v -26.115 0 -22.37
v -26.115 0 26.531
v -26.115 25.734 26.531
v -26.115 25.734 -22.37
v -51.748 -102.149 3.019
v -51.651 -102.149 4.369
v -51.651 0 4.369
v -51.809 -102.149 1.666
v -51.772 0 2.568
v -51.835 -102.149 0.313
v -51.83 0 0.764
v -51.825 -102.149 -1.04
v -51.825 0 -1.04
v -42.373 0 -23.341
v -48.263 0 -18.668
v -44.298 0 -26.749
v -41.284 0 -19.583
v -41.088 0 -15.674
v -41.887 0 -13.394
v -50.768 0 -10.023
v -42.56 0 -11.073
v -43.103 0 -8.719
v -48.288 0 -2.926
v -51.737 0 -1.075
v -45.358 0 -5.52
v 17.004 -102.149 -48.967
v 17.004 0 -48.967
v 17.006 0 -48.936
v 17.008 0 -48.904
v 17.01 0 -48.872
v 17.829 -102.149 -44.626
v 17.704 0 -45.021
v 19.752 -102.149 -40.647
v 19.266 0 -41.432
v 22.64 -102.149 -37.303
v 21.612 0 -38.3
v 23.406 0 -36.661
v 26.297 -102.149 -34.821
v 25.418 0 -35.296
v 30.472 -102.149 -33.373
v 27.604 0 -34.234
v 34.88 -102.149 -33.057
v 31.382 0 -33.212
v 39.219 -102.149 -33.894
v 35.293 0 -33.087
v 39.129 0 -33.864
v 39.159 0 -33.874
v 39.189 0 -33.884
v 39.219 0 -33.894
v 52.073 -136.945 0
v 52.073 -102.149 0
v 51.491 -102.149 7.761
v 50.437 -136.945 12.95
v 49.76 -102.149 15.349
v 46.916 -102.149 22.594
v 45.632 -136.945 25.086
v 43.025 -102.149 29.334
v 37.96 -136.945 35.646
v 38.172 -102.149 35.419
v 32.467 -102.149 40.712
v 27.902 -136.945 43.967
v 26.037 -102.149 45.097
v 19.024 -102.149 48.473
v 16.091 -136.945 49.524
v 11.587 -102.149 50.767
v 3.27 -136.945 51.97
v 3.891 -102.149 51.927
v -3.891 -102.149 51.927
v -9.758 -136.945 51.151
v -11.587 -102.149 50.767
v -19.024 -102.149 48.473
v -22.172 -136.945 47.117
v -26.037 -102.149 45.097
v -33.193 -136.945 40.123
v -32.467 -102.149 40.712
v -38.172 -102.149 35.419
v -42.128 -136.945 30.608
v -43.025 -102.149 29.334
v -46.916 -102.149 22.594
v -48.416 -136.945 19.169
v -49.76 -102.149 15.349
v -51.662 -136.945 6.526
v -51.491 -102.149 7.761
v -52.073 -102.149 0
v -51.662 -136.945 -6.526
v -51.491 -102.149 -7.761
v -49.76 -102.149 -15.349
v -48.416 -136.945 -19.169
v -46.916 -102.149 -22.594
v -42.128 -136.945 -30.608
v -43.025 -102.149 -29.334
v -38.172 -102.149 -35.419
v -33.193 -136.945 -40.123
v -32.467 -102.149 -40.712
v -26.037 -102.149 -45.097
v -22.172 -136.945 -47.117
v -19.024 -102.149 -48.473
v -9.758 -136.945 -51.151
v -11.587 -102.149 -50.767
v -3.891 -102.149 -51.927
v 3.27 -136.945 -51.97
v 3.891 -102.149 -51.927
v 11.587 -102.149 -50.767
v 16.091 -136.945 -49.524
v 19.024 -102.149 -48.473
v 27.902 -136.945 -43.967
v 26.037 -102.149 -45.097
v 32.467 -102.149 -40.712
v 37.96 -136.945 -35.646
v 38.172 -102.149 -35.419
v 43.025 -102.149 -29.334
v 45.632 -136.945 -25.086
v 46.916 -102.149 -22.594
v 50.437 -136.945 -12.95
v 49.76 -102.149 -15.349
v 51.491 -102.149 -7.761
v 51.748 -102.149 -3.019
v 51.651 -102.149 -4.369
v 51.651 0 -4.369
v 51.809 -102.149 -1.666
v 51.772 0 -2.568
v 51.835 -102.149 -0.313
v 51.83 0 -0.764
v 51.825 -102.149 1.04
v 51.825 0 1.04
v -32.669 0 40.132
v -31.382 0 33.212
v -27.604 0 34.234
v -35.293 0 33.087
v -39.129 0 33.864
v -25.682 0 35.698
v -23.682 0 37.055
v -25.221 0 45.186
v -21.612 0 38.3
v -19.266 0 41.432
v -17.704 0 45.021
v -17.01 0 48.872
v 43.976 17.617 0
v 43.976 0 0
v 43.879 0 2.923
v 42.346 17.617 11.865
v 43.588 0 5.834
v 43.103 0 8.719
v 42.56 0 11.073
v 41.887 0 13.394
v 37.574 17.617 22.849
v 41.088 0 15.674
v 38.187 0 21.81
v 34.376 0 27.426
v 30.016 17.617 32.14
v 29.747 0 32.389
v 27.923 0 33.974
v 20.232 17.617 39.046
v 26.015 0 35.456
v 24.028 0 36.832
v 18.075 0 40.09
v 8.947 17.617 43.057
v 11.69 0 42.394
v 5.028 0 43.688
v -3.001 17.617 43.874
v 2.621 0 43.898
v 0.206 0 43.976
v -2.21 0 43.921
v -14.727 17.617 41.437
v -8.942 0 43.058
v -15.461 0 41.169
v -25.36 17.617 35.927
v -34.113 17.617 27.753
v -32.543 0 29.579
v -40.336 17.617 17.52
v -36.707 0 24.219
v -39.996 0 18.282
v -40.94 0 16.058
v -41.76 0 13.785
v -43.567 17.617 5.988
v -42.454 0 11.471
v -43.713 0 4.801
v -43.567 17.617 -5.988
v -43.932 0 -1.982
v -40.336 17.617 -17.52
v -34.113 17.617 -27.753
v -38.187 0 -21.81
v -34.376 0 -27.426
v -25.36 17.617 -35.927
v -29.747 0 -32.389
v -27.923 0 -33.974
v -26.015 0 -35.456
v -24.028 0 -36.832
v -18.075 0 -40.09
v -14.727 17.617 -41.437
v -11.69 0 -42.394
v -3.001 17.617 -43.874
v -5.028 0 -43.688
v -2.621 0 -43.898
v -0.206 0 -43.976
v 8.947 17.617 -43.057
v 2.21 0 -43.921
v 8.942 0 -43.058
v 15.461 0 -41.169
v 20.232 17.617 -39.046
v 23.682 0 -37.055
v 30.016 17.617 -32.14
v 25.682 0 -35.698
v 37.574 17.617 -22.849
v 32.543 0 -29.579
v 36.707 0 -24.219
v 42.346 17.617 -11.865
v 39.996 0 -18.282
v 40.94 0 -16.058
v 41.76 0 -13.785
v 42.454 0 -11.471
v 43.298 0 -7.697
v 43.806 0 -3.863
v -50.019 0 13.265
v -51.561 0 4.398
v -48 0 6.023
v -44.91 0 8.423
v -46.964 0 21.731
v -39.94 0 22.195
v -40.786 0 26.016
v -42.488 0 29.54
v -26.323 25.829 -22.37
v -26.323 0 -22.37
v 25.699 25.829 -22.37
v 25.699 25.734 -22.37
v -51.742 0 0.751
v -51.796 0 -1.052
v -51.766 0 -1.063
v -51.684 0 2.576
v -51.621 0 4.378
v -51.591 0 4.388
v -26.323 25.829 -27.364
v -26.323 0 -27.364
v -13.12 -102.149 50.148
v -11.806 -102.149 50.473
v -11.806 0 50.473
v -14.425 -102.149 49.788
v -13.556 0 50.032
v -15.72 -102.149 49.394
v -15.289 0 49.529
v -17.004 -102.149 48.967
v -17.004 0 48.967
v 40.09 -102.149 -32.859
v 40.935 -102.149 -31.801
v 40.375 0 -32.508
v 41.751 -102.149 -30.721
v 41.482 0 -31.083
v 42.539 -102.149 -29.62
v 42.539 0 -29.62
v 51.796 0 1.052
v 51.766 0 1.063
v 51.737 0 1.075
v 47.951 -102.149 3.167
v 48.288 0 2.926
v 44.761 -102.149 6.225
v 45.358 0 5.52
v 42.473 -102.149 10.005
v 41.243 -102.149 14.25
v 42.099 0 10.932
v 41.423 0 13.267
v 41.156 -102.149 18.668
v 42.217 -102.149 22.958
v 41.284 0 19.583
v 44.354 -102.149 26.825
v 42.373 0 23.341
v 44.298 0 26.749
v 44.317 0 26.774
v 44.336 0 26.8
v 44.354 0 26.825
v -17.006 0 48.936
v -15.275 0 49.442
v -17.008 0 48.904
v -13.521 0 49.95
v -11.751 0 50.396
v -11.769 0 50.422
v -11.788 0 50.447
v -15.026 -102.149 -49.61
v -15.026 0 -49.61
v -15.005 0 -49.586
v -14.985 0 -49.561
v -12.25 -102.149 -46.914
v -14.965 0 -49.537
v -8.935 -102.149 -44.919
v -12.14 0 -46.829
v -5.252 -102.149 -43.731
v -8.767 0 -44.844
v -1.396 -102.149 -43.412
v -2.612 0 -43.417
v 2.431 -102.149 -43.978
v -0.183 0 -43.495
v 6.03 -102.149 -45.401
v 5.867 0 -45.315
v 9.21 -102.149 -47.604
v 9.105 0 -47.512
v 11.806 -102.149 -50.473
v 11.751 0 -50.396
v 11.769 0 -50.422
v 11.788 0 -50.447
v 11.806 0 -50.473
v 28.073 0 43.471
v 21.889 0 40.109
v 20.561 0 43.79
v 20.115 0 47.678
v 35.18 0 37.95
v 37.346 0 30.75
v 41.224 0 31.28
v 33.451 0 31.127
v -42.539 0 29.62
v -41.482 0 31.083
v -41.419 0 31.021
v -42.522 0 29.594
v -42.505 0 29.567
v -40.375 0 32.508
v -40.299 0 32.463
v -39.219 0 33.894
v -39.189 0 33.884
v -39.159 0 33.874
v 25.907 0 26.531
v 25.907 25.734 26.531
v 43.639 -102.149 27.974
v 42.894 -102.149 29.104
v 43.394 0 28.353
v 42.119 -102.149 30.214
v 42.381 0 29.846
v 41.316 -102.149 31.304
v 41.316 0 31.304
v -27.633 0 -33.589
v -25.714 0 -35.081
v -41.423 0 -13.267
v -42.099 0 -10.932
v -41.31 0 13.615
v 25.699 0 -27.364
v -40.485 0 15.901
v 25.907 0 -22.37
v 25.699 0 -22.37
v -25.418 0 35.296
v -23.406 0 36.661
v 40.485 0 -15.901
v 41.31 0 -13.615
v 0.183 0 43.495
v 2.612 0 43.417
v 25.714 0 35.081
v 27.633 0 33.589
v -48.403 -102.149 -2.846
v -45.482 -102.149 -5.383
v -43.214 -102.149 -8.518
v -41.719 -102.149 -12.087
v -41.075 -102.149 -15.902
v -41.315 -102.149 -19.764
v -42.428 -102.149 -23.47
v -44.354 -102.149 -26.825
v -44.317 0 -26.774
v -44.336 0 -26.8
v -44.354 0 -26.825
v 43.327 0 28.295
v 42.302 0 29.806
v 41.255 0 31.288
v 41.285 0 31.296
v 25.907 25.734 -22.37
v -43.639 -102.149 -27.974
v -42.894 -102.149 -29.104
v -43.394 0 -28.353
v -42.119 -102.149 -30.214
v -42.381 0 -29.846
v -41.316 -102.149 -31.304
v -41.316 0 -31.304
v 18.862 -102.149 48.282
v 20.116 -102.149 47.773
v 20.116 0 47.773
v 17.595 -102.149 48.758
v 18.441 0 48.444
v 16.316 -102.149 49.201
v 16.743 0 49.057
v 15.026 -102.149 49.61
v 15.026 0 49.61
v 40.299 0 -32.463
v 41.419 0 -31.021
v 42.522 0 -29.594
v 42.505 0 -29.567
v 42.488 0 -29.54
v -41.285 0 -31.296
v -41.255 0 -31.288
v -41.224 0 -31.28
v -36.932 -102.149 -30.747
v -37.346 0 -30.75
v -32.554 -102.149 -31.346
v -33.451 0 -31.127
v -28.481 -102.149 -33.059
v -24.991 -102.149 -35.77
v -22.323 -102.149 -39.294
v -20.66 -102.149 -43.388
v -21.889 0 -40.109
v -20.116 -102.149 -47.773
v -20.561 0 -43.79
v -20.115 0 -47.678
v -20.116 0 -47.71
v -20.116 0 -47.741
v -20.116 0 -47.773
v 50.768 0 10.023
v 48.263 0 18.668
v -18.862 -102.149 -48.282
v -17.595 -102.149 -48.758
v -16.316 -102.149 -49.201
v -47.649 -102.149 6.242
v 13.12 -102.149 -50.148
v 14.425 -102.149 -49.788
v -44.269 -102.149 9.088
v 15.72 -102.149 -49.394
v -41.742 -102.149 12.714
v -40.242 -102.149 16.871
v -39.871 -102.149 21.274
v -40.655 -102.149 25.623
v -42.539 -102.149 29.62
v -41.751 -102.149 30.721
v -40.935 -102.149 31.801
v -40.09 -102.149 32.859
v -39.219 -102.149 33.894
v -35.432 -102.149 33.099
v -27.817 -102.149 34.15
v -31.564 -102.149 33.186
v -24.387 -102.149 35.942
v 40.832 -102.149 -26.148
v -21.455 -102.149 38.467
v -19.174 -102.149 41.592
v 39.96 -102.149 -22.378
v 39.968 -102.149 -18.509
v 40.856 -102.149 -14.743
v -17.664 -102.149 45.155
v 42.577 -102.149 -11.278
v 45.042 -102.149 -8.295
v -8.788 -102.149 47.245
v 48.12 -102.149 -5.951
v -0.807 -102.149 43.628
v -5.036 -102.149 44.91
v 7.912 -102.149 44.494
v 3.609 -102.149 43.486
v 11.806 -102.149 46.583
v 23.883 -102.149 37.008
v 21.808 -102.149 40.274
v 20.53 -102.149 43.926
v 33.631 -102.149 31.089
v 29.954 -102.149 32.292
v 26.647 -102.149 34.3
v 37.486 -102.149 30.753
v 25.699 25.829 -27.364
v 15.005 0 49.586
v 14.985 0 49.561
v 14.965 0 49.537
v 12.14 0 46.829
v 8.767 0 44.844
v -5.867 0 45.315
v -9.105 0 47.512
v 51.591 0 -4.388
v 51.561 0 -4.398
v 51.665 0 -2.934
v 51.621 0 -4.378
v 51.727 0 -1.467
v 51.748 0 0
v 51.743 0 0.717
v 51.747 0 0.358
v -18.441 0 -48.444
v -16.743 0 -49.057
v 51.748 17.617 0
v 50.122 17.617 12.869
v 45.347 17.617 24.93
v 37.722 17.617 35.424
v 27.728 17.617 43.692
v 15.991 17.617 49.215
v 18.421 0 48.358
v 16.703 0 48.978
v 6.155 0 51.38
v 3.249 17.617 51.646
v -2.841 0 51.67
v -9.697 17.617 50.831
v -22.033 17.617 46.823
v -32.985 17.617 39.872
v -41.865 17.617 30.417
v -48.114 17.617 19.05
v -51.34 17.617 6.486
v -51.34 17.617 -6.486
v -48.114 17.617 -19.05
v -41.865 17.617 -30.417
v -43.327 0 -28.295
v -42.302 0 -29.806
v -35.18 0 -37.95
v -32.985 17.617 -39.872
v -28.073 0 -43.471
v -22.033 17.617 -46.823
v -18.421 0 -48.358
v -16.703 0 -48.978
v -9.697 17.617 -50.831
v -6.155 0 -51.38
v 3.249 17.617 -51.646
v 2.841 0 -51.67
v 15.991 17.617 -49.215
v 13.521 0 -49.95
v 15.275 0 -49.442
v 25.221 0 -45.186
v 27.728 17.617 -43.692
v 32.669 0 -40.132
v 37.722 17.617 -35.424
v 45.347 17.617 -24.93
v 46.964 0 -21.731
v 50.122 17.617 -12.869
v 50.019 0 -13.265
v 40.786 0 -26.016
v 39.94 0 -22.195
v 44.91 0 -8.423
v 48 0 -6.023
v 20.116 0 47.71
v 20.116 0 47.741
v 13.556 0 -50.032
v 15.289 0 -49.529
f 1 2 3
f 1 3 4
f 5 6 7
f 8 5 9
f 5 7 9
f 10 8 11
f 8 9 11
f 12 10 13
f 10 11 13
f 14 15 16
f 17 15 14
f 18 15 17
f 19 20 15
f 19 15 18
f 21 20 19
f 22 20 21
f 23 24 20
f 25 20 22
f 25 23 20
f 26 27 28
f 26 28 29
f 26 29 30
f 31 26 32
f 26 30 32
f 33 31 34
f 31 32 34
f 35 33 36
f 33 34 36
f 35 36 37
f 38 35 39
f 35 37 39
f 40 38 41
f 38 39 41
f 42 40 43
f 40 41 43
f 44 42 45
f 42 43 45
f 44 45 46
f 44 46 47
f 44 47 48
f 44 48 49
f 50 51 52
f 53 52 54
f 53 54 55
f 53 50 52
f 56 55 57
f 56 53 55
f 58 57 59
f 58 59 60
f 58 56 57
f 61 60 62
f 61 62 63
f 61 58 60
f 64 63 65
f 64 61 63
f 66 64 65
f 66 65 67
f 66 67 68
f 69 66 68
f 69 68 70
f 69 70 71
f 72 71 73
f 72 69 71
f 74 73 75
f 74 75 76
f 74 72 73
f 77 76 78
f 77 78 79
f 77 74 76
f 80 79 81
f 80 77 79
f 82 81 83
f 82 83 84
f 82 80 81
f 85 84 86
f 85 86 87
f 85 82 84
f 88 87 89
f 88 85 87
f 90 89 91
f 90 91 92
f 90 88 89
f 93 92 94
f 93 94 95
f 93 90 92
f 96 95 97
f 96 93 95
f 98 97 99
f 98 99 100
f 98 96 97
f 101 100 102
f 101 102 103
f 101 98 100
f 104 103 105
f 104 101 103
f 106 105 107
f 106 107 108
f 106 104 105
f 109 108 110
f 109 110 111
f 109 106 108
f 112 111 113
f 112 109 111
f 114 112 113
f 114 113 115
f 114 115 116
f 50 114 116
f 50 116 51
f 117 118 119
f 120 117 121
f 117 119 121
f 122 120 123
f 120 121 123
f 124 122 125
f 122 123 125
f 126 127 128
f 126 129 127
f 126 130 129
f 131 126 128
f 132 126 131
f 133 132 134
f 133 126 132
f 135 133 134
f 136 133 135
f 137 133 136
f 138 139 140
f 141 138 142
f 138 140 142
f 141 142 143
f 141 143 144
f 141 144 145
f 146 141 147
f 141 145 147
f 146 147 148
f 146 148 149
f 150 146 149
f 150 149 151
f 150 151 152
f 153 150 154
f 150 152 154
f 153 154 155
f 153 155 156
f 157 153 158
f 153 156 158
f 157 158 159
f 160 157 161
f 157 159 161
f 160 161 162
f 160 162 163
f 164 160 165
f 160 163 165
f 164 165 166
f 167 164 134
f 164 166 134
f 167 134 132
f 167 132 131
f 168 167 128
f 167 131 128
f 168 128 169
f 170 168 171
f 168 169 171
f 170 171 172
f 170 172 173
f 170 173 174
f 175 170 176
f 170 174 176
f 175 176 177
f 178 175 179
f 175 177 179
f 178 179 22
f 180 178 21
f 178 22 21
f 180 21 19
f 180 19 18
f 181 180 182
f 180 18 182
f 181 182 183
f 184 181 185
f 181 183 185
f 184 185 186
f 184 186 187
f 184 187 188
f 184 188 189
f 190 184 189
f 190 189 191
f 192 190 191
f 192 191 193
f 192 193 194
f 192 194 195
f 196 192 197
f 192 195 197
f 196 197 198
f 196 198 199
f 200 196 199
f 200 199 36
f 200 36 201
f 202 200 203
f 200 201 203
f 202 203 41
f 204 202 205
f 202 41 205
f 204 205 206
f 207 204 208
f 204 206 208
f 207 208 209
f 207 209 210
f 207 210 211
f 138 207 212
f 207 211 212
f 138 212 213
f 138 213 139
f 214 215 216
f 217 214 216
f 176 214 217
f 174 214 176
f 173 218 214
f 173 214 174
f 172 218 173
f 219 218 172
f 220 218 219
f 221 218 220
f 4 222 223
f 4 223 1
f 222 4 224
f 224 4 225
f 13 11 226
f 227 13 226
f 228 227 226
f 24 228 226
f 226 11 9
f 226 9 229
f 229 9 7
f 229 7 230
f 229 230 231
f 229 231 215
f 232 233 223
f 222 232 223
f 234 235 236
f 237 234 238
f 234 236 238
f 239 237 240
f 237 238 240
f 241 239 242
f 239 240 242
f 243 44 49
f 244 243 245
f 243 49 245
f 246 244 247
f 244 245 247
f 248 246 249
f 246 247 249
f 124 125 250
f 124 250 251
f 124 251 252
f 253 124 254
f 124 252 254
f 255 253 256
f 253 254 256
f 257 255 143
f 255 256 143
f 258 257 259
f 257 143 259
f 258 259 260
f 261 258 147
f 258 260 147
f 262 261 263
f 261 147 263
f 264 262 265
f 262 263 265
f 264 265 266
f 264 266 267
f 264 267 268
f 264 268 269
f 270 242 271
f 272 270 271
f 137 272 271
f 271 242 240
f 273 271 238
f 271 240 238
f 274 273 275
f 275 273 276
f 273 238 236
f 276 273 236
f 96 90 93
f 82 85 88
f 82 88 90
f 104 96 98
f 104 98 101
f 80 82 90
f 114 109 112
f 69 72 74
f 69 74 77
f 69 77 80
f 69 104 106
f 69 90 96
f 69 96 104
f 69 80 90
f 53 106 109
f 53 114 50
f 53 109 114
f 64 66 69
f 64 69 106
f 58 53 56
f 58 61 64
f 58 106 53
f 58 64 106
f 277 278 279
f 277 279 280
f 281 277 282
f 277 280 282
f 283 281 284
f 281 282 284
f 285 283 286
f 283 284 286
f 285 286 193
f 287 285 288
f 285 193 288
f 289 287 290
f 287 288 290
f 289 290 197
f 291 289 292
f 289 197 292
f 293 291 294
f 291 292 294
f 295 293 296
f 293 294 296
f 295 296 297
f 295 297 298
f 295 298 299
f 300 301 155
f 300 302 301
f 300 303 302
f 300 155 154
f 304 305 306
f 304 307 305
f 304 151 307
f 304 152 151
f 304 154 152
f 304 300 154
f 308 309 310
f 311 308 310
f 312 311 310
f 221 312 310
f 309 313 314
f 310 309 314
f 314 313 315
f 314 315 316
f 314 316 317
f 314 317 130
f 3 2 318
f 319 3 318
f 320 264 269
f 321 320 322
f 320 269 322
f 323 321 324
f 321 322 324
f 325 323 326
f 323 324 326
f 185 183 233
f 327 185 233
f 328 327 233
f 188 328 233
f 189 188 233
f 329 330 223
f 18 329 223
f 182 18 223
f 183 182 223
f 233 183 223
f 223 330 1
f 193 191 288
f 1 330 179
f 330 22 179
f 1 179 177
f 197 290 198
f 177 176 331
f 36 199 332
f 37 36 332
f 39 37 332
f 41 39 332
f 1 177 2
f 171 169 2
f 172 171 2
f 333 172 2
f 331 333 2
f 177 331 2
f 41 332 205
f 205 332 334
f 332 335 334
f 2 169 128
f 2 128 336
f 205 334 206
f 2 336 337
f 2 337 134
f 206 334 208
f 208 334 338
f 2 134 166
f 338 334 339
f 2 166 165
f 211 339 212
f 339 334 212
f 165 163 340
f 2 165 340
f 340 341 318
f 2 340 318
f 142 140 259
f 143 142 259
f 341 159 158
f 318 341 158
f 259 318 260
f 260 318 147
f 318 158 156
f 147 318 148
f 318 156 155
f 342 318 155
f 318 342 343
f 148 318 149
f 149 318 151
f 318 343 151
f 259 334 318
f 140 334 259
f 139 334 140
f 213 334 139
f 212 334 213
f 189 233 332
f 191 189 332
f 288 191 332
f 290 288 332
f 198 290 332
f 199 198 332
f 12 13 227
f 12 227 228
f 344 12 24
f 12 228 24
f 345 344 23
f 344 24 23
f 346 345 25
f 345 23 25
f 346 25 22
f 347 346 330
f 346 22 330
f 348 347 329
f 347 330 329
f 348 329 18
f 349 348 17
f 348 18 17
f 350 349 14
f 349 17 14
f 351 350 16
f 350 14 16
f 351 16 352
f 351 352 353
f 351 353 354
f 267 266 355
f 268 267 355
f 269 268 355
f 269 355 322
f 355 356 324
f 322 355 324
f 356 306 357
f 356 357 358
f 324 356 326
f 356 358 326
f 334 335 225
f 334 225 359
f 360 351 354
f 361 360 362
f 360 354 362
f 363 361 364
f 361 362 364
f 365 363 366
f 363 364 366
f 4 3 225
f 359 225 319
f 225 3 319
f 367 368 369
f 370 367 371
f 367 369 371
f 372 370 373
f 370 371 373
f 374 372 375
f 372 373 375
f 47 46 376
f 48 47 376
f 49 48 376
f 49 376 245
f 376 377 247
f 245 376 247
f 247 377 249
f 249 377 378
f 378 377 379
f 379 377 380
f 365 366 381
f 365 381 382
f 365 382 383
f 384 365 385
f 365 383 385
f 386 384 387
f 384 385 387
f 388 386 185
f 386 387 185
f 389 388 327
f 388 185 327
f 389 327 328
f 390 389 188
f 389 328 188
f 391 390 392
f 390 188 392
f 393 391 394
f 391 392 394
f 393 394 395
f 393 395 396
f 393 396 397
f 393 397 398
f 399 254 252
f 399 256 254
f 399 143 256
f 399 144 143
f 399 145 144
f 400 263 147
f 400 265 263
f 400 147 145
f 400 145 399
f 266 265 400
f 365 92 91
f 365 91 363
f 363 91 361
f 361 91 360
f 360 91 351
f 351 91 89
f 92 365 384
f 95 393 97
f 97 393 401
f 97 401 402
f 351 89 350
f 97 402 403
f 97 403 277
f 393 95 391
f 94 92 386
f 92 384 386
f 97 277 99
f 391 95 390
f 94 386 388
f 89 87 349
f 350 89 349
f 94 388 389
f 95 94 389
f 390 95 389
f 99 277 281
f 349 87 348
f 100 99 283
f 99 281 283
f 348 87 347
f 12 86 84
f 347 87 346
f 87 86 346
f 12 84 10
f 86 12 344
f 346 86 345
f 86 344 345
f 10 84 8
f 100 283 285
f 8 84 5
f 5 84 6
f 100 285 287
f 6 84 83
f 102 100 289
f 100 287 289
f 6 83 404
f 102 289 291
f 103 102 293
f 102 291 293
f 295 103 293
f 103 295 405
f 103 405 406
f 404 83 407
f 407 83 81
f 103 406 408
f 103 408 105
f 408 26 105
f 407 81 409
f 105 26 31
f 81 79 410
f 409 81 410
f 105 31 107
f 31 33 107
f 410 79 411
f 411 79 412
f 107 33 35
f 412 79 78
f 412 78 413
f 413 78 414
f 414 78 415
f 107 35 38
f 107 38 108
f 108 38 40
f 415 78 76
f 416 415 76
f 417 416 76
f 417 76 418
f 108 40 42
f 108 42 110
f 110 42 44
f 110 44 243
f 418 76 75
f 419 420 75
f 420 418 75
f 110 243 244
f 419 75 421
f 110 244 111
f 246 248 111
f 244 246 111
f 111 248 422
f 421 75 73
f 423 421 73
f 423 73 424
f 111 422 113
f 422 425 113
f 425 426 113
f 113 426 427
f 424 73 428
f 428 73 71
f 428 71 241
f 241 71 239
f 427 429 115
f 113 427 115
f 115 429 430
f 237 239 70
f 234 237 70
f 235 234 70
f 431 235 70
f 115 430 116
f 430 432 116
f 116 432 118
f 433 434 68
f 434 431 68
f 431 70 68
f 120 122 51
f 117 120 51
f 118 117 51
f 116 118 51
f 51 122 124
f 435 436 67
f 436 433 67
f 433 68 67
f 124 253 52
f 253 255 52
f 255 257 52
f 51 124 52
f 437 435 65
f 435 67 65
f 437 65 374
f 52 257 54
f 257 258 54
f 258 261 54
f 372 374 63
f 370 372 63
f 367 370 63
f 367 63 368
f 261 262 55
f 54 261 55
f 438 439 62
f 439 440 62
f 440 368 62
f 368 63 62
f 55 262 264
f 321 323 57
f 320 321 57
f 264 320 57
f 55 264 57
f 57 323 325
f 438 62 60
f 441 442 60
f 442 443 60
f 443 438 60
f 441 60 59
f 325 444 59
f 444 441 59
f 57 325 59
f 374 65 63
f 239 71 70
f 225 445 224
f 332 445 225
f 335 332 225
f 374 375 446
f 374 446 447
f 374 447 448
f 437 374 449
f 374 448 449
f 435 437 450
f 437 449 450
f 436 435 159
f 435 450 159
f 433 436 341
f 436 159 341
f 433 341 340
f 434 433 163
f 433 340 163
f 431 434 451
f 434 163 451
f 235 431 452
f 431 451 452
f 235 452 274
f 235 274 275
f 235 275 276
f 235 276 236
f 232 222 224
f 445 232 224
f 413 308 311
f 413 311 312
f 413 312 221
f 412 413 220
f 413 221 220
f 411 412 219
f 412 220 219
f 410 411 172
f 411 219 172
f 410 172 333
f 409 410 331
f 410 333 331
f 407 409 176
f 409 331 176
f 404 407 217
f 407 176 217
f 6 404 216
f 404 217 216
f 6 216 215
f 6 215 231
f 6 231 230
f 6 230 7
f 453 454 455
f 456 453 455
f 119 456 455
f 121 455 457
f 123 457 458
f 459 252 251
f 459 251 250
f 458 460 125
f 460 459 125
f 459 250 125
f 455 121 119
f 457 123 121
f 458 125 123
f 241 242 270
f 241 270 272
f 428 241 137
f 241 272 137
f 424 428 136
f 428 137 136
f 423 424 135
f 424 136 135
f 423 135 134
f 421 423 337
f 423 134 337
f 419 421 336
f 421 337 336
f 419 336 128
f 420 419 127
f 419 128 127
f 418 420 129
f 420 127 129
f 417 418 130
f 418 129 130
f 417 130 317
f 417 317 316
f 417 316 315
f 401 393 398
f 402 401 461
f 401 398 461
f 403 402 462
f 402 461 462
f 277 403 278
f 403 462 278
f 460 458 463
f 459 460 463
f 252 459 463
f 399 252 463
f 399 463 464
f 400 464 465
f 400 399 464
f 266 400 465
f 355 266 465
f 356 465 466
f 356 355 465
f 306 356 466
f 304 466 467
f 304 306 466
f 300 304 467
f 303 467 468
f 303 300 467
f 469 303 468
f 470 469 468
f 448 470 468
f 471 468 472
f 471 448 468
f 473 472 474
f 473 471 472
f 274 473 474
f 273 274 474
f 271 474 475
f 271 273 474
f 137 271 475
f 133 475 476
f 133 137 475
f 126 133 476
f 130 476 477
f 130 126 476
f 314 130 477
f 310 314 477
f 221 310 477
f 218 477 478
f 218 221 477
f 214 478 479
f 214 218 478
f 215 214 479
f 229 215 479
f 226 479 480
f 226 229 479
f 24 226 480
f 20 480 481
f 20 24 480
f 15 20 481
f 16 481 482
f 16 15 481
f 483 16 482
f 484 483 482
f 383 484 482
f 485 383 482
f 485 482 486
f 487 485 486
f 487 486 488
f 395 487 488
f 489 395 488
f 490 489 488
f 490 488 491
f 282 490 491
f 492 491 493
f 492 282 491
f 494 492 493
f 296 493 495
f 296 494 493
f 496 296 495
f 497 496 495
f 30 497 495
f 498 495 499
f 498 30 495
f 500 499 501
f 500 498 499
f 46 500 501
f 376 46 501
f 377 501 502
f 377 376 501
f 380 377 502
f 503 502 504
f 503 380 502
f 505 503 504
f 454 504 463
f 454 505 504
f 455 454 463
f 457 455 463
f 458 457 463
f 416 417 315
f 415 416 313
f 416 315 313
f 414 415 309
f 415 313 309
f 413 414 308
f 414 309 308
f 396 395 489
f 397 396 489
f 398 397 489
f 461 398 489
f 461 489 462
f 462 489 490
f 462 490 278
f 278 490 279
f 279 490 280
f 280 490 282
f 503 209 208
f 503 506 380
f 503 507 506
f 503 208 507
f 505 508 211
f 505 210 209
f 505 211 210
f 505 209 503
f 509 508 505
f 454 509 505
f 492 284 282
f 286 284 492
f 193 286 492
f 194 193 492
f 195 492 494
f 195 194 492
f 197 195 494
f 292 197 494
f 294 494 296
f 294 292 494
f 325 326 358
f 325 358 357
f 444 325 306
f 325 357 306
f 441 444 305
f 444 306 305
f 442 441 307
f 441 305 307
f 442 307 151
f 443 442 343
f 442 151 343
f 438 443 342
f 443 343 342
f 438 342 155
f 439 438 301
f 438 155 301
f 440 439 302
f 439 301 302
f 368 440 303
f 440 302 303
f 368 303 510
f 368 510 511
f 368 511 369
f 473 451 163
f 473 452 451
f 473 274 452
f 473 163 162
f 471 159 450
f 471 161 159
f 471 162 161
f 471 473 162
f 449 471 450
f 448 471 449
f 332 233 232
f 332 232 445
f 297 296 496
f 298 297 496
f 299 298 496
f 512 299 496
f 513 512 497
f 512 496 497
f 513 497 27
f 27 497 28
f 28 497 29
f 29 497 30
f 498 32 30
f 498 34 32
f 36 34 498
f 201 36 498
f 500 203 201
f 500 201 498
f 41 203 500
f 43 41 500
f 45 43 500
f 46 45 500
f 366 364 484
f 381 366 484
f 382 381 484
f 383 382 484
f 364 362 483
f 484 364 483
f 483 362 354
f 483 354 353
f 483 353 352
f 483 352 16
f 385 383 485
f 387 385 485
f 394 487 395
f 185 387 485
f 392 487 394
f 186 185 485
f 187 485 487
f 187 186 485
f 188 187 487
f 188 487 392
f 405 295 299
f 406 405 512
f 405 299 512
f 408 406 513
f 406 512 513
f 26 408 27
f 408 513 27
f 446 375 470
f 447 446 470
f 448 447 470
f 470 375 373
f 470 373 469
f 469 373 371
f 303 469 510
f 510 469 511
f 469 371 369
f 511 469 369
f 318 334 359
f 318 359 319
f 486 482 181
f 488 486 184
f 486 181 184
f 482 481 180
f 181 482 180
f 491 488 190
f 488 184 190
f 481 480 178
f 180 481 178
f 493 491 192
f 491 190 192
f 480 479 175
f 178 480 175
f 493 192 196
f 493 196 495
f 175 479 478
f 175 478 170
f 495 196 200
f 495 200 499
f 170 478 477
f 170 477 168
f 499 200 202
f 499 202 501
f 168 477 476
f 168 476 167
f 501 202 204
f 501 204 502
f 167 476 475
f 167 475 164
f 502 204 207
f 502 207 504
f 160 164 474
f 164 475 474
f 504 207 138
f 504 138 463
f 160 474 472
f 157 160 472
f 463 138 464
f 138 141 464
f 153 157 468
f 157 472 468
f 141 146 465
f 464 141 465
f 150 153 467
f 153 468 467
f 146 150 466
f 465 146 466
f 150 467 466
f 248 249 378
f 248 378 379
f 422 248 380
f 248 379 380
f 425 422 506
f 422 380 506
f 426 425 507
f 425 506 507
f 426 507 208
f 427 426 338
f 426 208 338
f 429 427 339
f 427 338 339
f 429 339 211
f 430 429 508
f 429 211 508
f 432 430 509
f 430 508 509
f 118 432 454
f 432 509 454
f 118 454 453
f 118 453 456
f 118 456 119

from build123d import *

# Parameters (mm, degrees)
F1_DEPTH  = 67.15461
F2_DEPTH  = 69.79008
F3_R      = 51.747749
F3_R_2    = 43.976375
F4_DEPTH  = 17.61725
F5_W      = 52.022107
F5_H      = 22.369506
F5_H_2    = 19.664356
F5_H_3    = 6.866917
F6_DEPTH  = 25.7345
F7_W      = 52.022105
F7_H      = 4.994122
F8_DEPTH  = 25.82881
F9_R      = 52.073065
F10_DEPTH = 34.79581


with BuildPart() as f1:
    # F0 (on Front) → F1 (new body)
    with BuildSketch(Plane.XZ):
        with BuildLine():
            ThreePointArc((15.025515, 49.610047), (1.396386, 43.41215), (-11.806262, 50.473112))
            ThreePointArc((-11.806262, 50.473112), (-14.424876, 49.788009), (-17.004157, 48.967147))
            ThreePointArc((-17.004157, 48.967147), (-24.387322, 35.941942), (-39.218818, 33.894058))
            ThreePointArc((-39.218818, 33.894058), (-40.934627, 31.800616), (-42.538819, 29.620462))
            ThreePointArc((-42.538819, 29.620462), (-40.855901, 14.743134), (-51.651118, 4.368627))
            ThreePointArc((-51.651118, 4.368627), (-51.808742, 1.666469), (-51.825098, -1.040233))
            ThreePointArc((-51.825098, -1.040233), (-41.718915, -12.08705), (-44.354446, -26.825472))
            ThreePointArc((-44.354446, -26.825472), (-42.893678, -29.104213), (-41.315951, -31.303595))
            ThreePointArc((-41.315951, -31.303595), (-26.646721, -34.300392), (-20.115884, -47.773152))
            ThreePointArc((-20.115884, -47.773152), (-17.594688, -48.758074), (-15.025515, -49.610047))
            ThreePointArc((-15.025515, -49.610047), (-1.396386, -43.41215), (11.806262, -50.473112))
            ThreePointArc((11.806262, -50.473112), (14.424876, -49.788009), (17.004157, -48.967147))
            ThreePointArc((17.004157, -48.967147), (24.387322, -35.941942), (39.218818, -33.894058))
            ThreePointArc((39.218818, -33.894058), (40.934627, -31.800616), (42.538819, -29.620462))
            ThreePointArc((42.538819, -29.620462), (40.855901, -14.743134), (51.651118, -4.368627))
            ThreePointArc((51.651118, -4.368627), (51.808742, -1.666469), (51.825098, 1.040233))
            ThreePointArc((51.825098, 1.040233), (41.718915, 12.08705), (44.354446, 26.825472))
            ThreePointArc((44.354446, 26.825472), (42.893678, 29.104213), (41.315951, 31.303595))
            ThreePointArc((41.315951, 31.303595), (26.646721, 34.300392), (20.115884, 47.773152))
            ThreePointArc((20.115884, 47.773152), (17.594688, 48.758074), (15.025515, 49.610047))
        make_face()
    extrude(amount=F1_DEPTH)

    # F1_face (on face) → F2 (join)
    with BuildSketch(Plane.XZ.offset(67.15461)):
        with BuildLine():
            ThreePointArc((41.315951, 31.303595), (26.646721, 34.300392), (20.115884, 47.773152))
            ThreePointArc((20.115884, 47.773152), (17.594688, 48.758074), (15.025515, 49.610047))
            ThreePointArc((15.025515, 49.610047), (1.396386, 43.41215), (-11.806262, 50.473112))
            ThreePointArc((-11.806262, 50.473112), (-14.424876, 49.788009), (-17.004157, 48.967147))
            ThreePointArc((-17.004157, 48.967147), (-24.387322, 35.941942), (-39.218818, 33.894058))
            ThreePointArc((-39.218818, 33.894058), (-40.934627, 31.800616), (-42.538819, 29.620462))
            ThreePointArc((-42.538819, 29.620462), (-40.855901, 14.743134), (-51.651118, 4.368627))
            ThreePointArc((-51.651118, 4.368627), (-51.808742, 1.666469), (-51.825098, -1.040233))
            ThreePointArc((-51.825098, -1.040233), (-41.718915, -12.08705), (-44.354446, -26.825472))
            ThreePointArc((-44.354446, -26.825472), (-42.893678, -29.104213), (-41.315951, -31.303595))
            ThreePointArc((-41.315951, -31.303595), (-26.646721, -34.300392), (-20.115884, -47.773152))
            ThreePointArc((-20.115884, -47.773152), (-17.594688, -48.758074), (-15.025515, -49.610047))
            ThreePointArc((-15.025515, -49.610047), (-1.396386, -43.41215), (11.806262, -50.473112))
            ThreePointArc((11.806262, -50.473112), (14.424876, -49.788009), (17.004157, -48.967147))
            ThreePointArc((17.004157, -48.967147), (24.387322, -35.941942), (39.218818, -33.894058))
            ThreePointArc((39.218818, -33.894058), (40.934627, -31.800616), (42.538819, -29.620462))
            ThreePointArc((42.538819, -29.620462), (40.855901, -14.743134), (51.651118, -4.368627))
            ThreePointArc((51.651118, -4.368627), (51.808742, -1.666469), (51.825098, 1.040233))
            ThreePointArc((51.825098, 1.040233), (41.718915, 12.08705), (44.354446, 26.825472))
            ThreePointArc((44.354446, 26.825472), (42.893678, 29.104213), (41.315951, 31.303595))
        make_face()
        with BuildLine():
            ThreePointArc((20.115884, 47.773152), (26.646721, 34.300392), (41.315951, 31.303595))
            ThreePointArc((41.315951, 31.303595), (42.893678, 29.104213), (44.354446, 26.825472))
            ThreePointArc((44.354446, 26.825472), (41.718915, 12.08705), (51.825098, 1.040233))
            ThreePointArc((51.825098, 1.040233), (51.808742, -1.666469), (51.651118, -4.368627))
            ThreePointArc((51.651118, -4.368627), (40.855901, -14.743134), (42.538819, -29.620462))
            ThreePointArc((42.538819, -29.620462), (40.934627, -31.800616), (39.218818, -33.894058))
            ThreePointArc((39.218818, -33.894058), (24.387322, -35.941942), (17.004157, -48.967147))
            ThreePointArc((17.004157, -48.967147), (14.424876, -49.788009), (11.806262, -50.473112))
            ThreePointArc((11.806262, -50.473112), (-1.396386, -43.41215), (-15.025515, -49.610047))
            ThreePointArc((-15.025515, -49.610047), (-17.594688, -48.758074), (-20.115884, -47.773152))
            ThreePointArc((-20.115884, -47.773152), (-26.646721, -34.300392), (-41.315951, -31.303595))
            ThreePointArc((-41.315951, -31.303595), (-42.893678, -29.104213), (-44.354446, -26.825472))
            ThreePointArc((-44.354446, -26.825472), (-41.718915, -12.08705), (-51.825098, -1.040233))
            ThreePointArc((-51.825098, -1.040233), (-51.808742, 1.666469), (-51.651118, 4.368627))
            ThreePointArc((-51.651118, 4.368627), (-40.855901, 14.743134), (-42.538819, 29.620462))
            ThreePointArc((-42.538819, 29.620462), (-40.934627, 31.800616), (-39.218818, 33.894058))
            ThreePointArc((-39.218818, 33.894058), (-24.387322, 35.941942), (-17.004157, 48.967147))
            ThreePointArc((-17.004157, 48.967147), (-14.424876, 49.788009), (-11.806262, 50.473112))
            ThreePointArc((-11.806262, 50.473112), (1.396386, 43.41215), (15.025515, 49.610047))
            ThreePointArc((15.025515, 49.610047), (17.594688, 48.758074), (20.115884, 47.773152))
        make_face()
    extrude(amount=F2_DEPTH)

    # F3 (on Front) → F4 (join)
    with BuildSketch(Plane.XZ):
        Circle(F3_R)
        Circle(F3_R_2, mode=Mode.SUBTRACT)
    extrude(amount=-F4_DEPTH)

    # F5 (on Front) → F6 (join)
    with BuildSketch(Plane.XZ):
        with Locations((-0.104043, -11.184753)):
            Rectangle(F5_W, F5_H)
        with Locations((-0.104043, 9.832178)):
            Rectangle(F5_W, F5_H_2)
        with Locations((-0.104043, 23.097814)):
            Rectangle(F5_W, F5_H_3)
    extrude(amount=-F6_DEPTH)

    # F7 (on Front) → F8 (join)
    with BuildSketch(Plane.XZ):
        with Locations((-0.312131, -24.866567)):
            Rectangle(F7_W, F7_H)
    extrude(amount=-F8_DEPTH)

    # F9 (on face) → F10 (join)
    with BuildSketch(Plane.XZ.offset(136.94469)):
        Circle(F9_R)
    extrude(amount=-F10_DEPTH)


solid = f1.part
